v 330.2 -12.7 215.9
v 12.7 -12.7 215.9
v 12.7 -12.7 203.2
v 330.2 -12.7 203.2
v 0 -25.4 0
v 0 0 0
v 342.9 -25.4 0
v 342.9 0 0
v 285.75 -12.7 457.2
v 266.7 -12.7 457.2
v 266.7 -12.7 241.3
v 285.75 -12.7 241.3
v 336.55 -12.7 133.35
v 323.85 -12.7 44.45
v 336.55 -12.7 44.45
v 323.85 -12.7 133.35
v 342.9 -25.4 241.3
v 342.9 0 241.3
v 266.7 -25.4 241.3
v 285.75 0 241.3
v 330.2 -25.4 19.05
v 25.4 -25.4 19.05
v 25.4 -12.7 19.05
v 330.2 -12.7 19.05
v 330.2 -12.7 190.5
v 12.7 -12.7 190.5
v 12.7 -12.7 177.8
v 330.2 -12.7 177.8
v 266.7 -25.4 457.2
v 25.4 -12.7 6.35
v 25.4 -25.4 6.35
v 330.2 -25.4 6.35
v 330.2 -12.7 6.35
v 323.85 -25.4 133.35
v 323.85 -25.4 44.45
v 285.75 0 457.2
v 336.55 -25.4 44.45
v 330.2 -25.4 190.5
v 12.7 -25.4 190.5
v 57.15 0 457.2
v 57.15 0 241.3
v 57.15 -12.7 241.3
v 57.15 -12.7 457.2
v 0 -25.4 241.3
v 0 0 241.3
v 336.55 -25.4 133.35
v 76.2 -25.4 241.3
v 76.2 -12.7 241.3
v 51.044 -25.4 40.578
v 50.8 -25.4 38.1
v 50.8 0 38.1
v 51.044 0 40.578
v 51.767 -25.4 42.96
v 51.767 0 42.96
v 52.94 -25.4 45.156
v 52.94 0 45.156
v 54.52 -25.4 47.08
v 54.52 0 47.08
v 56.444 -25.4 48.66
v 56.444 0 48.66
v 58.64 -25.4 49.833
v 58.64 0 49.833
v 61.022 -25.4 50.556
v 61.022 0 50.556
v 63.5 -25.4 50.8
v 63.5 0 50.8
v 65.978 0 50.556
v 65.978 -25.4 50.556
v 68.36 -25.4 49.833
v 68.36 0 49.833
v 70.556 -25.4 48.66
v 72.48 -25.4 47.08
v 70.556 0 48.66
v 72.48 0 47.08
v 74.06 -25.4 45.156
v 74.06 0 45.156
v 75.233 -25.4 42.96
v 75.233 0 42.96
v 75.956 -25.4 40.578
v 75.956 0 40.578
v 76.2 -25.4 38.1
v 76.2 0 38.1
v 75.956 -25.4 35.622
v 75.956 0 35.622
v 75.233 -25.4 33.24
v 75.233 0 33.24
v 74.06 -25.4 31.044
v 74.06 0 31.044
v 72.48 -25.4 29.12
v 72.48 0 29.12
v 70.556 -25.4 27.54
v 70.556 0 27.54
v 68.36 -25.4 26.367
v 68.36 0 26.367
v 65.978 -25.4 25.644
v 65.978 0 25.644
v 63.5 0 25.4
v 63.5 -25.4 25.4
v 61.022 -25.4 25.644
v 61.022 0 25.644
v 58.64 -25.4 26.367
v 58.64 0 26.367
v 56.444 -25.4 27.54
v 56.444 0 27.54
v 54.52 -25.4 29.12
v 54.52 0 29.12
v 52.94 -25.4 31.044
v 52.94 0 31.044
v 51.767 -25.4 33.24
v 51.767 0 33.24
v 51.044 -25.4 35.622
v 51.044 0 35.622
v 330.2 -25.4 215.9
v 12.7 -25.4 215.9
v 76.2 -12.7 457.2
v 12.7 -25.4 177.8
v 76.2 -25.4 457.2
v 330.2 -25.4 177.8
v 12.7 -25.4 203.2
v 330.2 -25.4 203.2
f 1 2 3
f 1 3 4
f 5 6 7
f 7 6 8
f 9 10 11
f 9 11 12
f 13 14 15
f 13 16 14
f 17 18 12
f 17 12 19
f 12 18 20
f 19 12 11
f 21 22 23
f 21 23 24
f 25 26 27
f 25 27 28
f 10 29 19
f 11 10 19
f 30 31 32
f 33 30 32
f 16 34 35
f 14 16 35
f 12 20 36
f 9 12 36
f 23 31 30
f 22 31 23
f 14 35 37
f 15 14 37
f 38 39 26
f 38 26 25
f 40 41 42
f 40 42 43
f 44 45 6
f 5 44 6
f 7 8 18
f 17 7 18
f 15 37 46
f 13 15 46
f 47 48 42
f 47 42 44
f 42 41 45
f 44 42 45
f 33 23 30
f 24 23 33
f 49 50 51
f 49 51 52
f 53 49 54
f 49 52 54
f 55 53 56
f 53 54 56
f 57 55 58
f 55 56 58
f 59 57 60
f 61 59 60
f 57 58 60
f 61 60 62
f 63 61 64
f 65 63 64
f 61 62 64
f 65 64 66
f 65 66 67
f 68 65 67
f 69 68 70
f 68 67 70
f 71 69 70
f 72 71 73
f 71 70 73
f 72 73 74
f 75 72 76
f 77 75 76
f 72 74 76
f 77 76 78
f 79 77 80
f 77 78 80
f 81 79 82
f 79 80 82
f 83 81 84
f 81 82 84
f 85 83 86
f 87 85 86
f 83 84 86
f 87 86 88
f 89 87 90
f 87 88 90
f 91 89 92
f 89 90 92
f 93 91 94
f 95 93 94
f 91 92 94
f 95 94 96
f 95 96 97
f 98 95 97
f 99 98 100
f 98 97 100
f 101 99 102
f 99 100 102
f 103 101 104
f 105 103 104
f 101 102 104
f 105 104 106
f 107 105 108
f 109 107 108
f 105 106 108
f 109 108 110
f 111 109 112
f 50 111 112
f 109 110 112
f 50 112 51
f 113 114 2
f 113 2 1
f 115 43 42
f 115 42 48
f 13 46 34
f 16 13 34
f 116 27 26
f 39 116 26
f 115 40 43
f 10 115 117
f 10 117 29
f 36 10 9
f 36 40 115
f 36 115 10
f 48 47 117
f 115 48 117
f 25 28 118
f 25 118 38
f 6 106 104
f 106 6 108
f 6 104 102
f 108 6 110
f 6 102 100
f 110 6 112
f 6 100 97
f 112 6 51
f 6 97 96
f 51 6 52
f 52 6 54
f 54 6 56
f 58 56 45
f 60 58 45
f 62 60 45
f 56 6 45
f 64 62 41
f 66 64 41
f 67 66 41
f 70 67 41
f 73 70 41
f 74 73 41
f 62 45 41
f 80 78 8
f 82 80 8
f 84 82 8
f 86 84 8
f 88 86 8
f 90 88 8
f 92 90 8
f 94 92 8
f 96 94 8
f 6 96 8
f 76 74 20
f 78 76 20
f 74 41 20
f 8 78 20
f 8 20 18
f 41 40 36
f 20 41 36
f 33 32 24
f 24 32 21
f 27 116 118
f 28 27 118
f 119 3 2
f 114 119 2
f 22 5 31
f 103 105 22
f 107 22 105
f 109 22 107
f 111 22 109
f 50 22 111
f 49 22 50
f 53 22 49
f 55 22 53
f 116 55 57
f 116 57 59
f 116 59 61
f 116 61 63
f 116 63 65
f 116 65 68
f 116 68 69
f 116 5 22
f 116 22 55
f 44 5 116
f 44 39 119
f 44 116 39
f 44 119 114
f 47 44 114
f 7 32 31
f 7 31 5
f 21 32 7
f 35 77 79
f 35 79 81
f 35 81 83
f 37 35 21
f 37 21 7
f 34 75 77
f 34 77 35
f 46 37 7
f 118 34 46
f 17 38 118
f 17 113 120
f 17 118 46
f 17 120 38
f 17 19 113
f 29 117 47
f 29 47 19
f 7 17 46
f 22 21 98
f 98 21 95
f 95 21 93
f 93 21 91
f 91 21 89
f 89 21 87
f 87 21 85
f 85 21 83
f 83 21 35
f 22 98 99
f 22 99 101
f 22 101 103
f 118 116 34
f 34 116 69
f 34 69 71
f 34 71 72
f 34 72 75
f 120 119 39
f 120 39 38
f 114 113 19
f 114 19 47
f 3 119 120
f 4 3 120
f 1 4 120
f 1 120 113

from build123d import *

# Parameters (mm, degrees)
F0_W      = 342.9
F0_H      = 177.8
F0_W_2    = 228.6
F0_H_2    = 215.9
F1_DEPTH  = 25.4
F2_W      = 304.8
F2_H      = 12.7
F3_DEPTH  = 12.7
F4_W      = 304.8
F4_H      = 12.7
F5_DEPTH  = 12.7
F6_R      = 12.7
F7_DEPTH  = 25.4
F9_DEPTH  = 12.7
F11_DEPTH = 12.7
F12_W     = 317.5
F12_H     = 12.7
F13_DEPTH = 12.7


with BuildPart() as f1:
    # F0 (on Front) → F1 (new body)
    with BuildSketch(Plane.XZ):
        with Locations((171.45, 88.9)):
            Rectangle(F0_W, F0_H)
        Polygon((0, 241.3), (0, 177.8), (342.9, 177.8), (342.9, 241.3), (285.75, 241.3), (57.15, 241.3), align=None)
        with Locations((171.45, 349.25)):
            Rectangle(F0_W_2, F0_H_2)
    extrude(amount=F1_DEPTH)

    # F2 (on face) → F3 (cut)
    with BuildSketch(Plane.XZ.offset(25.4)):
        with Locations((177.8, 12.7)):
            Rectangle(F2_W, F2_H)
    extrude(amount=-F3_DEPTH, mode=Mode.SUBTRACT)

    # F4 (on face) → F5 (cut)
    with BuildSketch(Plane.XZ.offset(25.4)):
        with Locations((177.8, -12.7)):
            Rectangle(F4_W, F4_H)
    extrude(amount=-F5_DEPTH, mode=Mode.SUBTRACT)

    # F6 (on face) → F7 (cut)
    with BuildSketch(Plane(origin=(0, 0, 0), x_dir=(-1, 0, 0), z_dir=(0, 1, 0))):
        with Locations((-63.5, 38.1)):
            Circle(F6_R)
    extrude(amount=-F7_DEPTH, mode=Mode.SUBTRACT)

    # F8 (on face) → F9 (cut)
    with BuildSketch(Plane.XZ.offset(25.4)):
        Polygon((323.85, 44.45), (330.2, 44.45), (336.55, 44.45), (336.55, 133.35), (323.85, 133.35), align=None)
    extrude(amount=-F9_DEPTH, mode=Mode.SUBTRACT)

    # F10 (on face) → F11 (cut)
    with BuildSketch(Plane.XZ.offset(25.4)):
        Polygon((76.2, 438.15), (76.2, 457.2), (57.15, 457.2), (57.15, 241.3), (76.2, 241.3), align=None)
        Polygon((285.75, 241.3), (285.75, 457.2), (266.7, 457.2), (266.7, 438.15), (266.7, 241.3), align=None)
    extrude(amount=-F11_DEPTH, mode=Mode.SUBTRACT)

    # F12 (on face) → F13 (cut)
    with BuildSketch(Plane.XZ.offset(25.4)):
        with Locations((171.45, 209.55)):
            Rectangle(F12_W, F12_H)
        with Locations((171.45, 184.15)):
            Rectangle(F12_W, F12_H)
    extrude(amount=-F13_DEPTH, mode=Mode.SUBTRACT)


solid = f1.part
